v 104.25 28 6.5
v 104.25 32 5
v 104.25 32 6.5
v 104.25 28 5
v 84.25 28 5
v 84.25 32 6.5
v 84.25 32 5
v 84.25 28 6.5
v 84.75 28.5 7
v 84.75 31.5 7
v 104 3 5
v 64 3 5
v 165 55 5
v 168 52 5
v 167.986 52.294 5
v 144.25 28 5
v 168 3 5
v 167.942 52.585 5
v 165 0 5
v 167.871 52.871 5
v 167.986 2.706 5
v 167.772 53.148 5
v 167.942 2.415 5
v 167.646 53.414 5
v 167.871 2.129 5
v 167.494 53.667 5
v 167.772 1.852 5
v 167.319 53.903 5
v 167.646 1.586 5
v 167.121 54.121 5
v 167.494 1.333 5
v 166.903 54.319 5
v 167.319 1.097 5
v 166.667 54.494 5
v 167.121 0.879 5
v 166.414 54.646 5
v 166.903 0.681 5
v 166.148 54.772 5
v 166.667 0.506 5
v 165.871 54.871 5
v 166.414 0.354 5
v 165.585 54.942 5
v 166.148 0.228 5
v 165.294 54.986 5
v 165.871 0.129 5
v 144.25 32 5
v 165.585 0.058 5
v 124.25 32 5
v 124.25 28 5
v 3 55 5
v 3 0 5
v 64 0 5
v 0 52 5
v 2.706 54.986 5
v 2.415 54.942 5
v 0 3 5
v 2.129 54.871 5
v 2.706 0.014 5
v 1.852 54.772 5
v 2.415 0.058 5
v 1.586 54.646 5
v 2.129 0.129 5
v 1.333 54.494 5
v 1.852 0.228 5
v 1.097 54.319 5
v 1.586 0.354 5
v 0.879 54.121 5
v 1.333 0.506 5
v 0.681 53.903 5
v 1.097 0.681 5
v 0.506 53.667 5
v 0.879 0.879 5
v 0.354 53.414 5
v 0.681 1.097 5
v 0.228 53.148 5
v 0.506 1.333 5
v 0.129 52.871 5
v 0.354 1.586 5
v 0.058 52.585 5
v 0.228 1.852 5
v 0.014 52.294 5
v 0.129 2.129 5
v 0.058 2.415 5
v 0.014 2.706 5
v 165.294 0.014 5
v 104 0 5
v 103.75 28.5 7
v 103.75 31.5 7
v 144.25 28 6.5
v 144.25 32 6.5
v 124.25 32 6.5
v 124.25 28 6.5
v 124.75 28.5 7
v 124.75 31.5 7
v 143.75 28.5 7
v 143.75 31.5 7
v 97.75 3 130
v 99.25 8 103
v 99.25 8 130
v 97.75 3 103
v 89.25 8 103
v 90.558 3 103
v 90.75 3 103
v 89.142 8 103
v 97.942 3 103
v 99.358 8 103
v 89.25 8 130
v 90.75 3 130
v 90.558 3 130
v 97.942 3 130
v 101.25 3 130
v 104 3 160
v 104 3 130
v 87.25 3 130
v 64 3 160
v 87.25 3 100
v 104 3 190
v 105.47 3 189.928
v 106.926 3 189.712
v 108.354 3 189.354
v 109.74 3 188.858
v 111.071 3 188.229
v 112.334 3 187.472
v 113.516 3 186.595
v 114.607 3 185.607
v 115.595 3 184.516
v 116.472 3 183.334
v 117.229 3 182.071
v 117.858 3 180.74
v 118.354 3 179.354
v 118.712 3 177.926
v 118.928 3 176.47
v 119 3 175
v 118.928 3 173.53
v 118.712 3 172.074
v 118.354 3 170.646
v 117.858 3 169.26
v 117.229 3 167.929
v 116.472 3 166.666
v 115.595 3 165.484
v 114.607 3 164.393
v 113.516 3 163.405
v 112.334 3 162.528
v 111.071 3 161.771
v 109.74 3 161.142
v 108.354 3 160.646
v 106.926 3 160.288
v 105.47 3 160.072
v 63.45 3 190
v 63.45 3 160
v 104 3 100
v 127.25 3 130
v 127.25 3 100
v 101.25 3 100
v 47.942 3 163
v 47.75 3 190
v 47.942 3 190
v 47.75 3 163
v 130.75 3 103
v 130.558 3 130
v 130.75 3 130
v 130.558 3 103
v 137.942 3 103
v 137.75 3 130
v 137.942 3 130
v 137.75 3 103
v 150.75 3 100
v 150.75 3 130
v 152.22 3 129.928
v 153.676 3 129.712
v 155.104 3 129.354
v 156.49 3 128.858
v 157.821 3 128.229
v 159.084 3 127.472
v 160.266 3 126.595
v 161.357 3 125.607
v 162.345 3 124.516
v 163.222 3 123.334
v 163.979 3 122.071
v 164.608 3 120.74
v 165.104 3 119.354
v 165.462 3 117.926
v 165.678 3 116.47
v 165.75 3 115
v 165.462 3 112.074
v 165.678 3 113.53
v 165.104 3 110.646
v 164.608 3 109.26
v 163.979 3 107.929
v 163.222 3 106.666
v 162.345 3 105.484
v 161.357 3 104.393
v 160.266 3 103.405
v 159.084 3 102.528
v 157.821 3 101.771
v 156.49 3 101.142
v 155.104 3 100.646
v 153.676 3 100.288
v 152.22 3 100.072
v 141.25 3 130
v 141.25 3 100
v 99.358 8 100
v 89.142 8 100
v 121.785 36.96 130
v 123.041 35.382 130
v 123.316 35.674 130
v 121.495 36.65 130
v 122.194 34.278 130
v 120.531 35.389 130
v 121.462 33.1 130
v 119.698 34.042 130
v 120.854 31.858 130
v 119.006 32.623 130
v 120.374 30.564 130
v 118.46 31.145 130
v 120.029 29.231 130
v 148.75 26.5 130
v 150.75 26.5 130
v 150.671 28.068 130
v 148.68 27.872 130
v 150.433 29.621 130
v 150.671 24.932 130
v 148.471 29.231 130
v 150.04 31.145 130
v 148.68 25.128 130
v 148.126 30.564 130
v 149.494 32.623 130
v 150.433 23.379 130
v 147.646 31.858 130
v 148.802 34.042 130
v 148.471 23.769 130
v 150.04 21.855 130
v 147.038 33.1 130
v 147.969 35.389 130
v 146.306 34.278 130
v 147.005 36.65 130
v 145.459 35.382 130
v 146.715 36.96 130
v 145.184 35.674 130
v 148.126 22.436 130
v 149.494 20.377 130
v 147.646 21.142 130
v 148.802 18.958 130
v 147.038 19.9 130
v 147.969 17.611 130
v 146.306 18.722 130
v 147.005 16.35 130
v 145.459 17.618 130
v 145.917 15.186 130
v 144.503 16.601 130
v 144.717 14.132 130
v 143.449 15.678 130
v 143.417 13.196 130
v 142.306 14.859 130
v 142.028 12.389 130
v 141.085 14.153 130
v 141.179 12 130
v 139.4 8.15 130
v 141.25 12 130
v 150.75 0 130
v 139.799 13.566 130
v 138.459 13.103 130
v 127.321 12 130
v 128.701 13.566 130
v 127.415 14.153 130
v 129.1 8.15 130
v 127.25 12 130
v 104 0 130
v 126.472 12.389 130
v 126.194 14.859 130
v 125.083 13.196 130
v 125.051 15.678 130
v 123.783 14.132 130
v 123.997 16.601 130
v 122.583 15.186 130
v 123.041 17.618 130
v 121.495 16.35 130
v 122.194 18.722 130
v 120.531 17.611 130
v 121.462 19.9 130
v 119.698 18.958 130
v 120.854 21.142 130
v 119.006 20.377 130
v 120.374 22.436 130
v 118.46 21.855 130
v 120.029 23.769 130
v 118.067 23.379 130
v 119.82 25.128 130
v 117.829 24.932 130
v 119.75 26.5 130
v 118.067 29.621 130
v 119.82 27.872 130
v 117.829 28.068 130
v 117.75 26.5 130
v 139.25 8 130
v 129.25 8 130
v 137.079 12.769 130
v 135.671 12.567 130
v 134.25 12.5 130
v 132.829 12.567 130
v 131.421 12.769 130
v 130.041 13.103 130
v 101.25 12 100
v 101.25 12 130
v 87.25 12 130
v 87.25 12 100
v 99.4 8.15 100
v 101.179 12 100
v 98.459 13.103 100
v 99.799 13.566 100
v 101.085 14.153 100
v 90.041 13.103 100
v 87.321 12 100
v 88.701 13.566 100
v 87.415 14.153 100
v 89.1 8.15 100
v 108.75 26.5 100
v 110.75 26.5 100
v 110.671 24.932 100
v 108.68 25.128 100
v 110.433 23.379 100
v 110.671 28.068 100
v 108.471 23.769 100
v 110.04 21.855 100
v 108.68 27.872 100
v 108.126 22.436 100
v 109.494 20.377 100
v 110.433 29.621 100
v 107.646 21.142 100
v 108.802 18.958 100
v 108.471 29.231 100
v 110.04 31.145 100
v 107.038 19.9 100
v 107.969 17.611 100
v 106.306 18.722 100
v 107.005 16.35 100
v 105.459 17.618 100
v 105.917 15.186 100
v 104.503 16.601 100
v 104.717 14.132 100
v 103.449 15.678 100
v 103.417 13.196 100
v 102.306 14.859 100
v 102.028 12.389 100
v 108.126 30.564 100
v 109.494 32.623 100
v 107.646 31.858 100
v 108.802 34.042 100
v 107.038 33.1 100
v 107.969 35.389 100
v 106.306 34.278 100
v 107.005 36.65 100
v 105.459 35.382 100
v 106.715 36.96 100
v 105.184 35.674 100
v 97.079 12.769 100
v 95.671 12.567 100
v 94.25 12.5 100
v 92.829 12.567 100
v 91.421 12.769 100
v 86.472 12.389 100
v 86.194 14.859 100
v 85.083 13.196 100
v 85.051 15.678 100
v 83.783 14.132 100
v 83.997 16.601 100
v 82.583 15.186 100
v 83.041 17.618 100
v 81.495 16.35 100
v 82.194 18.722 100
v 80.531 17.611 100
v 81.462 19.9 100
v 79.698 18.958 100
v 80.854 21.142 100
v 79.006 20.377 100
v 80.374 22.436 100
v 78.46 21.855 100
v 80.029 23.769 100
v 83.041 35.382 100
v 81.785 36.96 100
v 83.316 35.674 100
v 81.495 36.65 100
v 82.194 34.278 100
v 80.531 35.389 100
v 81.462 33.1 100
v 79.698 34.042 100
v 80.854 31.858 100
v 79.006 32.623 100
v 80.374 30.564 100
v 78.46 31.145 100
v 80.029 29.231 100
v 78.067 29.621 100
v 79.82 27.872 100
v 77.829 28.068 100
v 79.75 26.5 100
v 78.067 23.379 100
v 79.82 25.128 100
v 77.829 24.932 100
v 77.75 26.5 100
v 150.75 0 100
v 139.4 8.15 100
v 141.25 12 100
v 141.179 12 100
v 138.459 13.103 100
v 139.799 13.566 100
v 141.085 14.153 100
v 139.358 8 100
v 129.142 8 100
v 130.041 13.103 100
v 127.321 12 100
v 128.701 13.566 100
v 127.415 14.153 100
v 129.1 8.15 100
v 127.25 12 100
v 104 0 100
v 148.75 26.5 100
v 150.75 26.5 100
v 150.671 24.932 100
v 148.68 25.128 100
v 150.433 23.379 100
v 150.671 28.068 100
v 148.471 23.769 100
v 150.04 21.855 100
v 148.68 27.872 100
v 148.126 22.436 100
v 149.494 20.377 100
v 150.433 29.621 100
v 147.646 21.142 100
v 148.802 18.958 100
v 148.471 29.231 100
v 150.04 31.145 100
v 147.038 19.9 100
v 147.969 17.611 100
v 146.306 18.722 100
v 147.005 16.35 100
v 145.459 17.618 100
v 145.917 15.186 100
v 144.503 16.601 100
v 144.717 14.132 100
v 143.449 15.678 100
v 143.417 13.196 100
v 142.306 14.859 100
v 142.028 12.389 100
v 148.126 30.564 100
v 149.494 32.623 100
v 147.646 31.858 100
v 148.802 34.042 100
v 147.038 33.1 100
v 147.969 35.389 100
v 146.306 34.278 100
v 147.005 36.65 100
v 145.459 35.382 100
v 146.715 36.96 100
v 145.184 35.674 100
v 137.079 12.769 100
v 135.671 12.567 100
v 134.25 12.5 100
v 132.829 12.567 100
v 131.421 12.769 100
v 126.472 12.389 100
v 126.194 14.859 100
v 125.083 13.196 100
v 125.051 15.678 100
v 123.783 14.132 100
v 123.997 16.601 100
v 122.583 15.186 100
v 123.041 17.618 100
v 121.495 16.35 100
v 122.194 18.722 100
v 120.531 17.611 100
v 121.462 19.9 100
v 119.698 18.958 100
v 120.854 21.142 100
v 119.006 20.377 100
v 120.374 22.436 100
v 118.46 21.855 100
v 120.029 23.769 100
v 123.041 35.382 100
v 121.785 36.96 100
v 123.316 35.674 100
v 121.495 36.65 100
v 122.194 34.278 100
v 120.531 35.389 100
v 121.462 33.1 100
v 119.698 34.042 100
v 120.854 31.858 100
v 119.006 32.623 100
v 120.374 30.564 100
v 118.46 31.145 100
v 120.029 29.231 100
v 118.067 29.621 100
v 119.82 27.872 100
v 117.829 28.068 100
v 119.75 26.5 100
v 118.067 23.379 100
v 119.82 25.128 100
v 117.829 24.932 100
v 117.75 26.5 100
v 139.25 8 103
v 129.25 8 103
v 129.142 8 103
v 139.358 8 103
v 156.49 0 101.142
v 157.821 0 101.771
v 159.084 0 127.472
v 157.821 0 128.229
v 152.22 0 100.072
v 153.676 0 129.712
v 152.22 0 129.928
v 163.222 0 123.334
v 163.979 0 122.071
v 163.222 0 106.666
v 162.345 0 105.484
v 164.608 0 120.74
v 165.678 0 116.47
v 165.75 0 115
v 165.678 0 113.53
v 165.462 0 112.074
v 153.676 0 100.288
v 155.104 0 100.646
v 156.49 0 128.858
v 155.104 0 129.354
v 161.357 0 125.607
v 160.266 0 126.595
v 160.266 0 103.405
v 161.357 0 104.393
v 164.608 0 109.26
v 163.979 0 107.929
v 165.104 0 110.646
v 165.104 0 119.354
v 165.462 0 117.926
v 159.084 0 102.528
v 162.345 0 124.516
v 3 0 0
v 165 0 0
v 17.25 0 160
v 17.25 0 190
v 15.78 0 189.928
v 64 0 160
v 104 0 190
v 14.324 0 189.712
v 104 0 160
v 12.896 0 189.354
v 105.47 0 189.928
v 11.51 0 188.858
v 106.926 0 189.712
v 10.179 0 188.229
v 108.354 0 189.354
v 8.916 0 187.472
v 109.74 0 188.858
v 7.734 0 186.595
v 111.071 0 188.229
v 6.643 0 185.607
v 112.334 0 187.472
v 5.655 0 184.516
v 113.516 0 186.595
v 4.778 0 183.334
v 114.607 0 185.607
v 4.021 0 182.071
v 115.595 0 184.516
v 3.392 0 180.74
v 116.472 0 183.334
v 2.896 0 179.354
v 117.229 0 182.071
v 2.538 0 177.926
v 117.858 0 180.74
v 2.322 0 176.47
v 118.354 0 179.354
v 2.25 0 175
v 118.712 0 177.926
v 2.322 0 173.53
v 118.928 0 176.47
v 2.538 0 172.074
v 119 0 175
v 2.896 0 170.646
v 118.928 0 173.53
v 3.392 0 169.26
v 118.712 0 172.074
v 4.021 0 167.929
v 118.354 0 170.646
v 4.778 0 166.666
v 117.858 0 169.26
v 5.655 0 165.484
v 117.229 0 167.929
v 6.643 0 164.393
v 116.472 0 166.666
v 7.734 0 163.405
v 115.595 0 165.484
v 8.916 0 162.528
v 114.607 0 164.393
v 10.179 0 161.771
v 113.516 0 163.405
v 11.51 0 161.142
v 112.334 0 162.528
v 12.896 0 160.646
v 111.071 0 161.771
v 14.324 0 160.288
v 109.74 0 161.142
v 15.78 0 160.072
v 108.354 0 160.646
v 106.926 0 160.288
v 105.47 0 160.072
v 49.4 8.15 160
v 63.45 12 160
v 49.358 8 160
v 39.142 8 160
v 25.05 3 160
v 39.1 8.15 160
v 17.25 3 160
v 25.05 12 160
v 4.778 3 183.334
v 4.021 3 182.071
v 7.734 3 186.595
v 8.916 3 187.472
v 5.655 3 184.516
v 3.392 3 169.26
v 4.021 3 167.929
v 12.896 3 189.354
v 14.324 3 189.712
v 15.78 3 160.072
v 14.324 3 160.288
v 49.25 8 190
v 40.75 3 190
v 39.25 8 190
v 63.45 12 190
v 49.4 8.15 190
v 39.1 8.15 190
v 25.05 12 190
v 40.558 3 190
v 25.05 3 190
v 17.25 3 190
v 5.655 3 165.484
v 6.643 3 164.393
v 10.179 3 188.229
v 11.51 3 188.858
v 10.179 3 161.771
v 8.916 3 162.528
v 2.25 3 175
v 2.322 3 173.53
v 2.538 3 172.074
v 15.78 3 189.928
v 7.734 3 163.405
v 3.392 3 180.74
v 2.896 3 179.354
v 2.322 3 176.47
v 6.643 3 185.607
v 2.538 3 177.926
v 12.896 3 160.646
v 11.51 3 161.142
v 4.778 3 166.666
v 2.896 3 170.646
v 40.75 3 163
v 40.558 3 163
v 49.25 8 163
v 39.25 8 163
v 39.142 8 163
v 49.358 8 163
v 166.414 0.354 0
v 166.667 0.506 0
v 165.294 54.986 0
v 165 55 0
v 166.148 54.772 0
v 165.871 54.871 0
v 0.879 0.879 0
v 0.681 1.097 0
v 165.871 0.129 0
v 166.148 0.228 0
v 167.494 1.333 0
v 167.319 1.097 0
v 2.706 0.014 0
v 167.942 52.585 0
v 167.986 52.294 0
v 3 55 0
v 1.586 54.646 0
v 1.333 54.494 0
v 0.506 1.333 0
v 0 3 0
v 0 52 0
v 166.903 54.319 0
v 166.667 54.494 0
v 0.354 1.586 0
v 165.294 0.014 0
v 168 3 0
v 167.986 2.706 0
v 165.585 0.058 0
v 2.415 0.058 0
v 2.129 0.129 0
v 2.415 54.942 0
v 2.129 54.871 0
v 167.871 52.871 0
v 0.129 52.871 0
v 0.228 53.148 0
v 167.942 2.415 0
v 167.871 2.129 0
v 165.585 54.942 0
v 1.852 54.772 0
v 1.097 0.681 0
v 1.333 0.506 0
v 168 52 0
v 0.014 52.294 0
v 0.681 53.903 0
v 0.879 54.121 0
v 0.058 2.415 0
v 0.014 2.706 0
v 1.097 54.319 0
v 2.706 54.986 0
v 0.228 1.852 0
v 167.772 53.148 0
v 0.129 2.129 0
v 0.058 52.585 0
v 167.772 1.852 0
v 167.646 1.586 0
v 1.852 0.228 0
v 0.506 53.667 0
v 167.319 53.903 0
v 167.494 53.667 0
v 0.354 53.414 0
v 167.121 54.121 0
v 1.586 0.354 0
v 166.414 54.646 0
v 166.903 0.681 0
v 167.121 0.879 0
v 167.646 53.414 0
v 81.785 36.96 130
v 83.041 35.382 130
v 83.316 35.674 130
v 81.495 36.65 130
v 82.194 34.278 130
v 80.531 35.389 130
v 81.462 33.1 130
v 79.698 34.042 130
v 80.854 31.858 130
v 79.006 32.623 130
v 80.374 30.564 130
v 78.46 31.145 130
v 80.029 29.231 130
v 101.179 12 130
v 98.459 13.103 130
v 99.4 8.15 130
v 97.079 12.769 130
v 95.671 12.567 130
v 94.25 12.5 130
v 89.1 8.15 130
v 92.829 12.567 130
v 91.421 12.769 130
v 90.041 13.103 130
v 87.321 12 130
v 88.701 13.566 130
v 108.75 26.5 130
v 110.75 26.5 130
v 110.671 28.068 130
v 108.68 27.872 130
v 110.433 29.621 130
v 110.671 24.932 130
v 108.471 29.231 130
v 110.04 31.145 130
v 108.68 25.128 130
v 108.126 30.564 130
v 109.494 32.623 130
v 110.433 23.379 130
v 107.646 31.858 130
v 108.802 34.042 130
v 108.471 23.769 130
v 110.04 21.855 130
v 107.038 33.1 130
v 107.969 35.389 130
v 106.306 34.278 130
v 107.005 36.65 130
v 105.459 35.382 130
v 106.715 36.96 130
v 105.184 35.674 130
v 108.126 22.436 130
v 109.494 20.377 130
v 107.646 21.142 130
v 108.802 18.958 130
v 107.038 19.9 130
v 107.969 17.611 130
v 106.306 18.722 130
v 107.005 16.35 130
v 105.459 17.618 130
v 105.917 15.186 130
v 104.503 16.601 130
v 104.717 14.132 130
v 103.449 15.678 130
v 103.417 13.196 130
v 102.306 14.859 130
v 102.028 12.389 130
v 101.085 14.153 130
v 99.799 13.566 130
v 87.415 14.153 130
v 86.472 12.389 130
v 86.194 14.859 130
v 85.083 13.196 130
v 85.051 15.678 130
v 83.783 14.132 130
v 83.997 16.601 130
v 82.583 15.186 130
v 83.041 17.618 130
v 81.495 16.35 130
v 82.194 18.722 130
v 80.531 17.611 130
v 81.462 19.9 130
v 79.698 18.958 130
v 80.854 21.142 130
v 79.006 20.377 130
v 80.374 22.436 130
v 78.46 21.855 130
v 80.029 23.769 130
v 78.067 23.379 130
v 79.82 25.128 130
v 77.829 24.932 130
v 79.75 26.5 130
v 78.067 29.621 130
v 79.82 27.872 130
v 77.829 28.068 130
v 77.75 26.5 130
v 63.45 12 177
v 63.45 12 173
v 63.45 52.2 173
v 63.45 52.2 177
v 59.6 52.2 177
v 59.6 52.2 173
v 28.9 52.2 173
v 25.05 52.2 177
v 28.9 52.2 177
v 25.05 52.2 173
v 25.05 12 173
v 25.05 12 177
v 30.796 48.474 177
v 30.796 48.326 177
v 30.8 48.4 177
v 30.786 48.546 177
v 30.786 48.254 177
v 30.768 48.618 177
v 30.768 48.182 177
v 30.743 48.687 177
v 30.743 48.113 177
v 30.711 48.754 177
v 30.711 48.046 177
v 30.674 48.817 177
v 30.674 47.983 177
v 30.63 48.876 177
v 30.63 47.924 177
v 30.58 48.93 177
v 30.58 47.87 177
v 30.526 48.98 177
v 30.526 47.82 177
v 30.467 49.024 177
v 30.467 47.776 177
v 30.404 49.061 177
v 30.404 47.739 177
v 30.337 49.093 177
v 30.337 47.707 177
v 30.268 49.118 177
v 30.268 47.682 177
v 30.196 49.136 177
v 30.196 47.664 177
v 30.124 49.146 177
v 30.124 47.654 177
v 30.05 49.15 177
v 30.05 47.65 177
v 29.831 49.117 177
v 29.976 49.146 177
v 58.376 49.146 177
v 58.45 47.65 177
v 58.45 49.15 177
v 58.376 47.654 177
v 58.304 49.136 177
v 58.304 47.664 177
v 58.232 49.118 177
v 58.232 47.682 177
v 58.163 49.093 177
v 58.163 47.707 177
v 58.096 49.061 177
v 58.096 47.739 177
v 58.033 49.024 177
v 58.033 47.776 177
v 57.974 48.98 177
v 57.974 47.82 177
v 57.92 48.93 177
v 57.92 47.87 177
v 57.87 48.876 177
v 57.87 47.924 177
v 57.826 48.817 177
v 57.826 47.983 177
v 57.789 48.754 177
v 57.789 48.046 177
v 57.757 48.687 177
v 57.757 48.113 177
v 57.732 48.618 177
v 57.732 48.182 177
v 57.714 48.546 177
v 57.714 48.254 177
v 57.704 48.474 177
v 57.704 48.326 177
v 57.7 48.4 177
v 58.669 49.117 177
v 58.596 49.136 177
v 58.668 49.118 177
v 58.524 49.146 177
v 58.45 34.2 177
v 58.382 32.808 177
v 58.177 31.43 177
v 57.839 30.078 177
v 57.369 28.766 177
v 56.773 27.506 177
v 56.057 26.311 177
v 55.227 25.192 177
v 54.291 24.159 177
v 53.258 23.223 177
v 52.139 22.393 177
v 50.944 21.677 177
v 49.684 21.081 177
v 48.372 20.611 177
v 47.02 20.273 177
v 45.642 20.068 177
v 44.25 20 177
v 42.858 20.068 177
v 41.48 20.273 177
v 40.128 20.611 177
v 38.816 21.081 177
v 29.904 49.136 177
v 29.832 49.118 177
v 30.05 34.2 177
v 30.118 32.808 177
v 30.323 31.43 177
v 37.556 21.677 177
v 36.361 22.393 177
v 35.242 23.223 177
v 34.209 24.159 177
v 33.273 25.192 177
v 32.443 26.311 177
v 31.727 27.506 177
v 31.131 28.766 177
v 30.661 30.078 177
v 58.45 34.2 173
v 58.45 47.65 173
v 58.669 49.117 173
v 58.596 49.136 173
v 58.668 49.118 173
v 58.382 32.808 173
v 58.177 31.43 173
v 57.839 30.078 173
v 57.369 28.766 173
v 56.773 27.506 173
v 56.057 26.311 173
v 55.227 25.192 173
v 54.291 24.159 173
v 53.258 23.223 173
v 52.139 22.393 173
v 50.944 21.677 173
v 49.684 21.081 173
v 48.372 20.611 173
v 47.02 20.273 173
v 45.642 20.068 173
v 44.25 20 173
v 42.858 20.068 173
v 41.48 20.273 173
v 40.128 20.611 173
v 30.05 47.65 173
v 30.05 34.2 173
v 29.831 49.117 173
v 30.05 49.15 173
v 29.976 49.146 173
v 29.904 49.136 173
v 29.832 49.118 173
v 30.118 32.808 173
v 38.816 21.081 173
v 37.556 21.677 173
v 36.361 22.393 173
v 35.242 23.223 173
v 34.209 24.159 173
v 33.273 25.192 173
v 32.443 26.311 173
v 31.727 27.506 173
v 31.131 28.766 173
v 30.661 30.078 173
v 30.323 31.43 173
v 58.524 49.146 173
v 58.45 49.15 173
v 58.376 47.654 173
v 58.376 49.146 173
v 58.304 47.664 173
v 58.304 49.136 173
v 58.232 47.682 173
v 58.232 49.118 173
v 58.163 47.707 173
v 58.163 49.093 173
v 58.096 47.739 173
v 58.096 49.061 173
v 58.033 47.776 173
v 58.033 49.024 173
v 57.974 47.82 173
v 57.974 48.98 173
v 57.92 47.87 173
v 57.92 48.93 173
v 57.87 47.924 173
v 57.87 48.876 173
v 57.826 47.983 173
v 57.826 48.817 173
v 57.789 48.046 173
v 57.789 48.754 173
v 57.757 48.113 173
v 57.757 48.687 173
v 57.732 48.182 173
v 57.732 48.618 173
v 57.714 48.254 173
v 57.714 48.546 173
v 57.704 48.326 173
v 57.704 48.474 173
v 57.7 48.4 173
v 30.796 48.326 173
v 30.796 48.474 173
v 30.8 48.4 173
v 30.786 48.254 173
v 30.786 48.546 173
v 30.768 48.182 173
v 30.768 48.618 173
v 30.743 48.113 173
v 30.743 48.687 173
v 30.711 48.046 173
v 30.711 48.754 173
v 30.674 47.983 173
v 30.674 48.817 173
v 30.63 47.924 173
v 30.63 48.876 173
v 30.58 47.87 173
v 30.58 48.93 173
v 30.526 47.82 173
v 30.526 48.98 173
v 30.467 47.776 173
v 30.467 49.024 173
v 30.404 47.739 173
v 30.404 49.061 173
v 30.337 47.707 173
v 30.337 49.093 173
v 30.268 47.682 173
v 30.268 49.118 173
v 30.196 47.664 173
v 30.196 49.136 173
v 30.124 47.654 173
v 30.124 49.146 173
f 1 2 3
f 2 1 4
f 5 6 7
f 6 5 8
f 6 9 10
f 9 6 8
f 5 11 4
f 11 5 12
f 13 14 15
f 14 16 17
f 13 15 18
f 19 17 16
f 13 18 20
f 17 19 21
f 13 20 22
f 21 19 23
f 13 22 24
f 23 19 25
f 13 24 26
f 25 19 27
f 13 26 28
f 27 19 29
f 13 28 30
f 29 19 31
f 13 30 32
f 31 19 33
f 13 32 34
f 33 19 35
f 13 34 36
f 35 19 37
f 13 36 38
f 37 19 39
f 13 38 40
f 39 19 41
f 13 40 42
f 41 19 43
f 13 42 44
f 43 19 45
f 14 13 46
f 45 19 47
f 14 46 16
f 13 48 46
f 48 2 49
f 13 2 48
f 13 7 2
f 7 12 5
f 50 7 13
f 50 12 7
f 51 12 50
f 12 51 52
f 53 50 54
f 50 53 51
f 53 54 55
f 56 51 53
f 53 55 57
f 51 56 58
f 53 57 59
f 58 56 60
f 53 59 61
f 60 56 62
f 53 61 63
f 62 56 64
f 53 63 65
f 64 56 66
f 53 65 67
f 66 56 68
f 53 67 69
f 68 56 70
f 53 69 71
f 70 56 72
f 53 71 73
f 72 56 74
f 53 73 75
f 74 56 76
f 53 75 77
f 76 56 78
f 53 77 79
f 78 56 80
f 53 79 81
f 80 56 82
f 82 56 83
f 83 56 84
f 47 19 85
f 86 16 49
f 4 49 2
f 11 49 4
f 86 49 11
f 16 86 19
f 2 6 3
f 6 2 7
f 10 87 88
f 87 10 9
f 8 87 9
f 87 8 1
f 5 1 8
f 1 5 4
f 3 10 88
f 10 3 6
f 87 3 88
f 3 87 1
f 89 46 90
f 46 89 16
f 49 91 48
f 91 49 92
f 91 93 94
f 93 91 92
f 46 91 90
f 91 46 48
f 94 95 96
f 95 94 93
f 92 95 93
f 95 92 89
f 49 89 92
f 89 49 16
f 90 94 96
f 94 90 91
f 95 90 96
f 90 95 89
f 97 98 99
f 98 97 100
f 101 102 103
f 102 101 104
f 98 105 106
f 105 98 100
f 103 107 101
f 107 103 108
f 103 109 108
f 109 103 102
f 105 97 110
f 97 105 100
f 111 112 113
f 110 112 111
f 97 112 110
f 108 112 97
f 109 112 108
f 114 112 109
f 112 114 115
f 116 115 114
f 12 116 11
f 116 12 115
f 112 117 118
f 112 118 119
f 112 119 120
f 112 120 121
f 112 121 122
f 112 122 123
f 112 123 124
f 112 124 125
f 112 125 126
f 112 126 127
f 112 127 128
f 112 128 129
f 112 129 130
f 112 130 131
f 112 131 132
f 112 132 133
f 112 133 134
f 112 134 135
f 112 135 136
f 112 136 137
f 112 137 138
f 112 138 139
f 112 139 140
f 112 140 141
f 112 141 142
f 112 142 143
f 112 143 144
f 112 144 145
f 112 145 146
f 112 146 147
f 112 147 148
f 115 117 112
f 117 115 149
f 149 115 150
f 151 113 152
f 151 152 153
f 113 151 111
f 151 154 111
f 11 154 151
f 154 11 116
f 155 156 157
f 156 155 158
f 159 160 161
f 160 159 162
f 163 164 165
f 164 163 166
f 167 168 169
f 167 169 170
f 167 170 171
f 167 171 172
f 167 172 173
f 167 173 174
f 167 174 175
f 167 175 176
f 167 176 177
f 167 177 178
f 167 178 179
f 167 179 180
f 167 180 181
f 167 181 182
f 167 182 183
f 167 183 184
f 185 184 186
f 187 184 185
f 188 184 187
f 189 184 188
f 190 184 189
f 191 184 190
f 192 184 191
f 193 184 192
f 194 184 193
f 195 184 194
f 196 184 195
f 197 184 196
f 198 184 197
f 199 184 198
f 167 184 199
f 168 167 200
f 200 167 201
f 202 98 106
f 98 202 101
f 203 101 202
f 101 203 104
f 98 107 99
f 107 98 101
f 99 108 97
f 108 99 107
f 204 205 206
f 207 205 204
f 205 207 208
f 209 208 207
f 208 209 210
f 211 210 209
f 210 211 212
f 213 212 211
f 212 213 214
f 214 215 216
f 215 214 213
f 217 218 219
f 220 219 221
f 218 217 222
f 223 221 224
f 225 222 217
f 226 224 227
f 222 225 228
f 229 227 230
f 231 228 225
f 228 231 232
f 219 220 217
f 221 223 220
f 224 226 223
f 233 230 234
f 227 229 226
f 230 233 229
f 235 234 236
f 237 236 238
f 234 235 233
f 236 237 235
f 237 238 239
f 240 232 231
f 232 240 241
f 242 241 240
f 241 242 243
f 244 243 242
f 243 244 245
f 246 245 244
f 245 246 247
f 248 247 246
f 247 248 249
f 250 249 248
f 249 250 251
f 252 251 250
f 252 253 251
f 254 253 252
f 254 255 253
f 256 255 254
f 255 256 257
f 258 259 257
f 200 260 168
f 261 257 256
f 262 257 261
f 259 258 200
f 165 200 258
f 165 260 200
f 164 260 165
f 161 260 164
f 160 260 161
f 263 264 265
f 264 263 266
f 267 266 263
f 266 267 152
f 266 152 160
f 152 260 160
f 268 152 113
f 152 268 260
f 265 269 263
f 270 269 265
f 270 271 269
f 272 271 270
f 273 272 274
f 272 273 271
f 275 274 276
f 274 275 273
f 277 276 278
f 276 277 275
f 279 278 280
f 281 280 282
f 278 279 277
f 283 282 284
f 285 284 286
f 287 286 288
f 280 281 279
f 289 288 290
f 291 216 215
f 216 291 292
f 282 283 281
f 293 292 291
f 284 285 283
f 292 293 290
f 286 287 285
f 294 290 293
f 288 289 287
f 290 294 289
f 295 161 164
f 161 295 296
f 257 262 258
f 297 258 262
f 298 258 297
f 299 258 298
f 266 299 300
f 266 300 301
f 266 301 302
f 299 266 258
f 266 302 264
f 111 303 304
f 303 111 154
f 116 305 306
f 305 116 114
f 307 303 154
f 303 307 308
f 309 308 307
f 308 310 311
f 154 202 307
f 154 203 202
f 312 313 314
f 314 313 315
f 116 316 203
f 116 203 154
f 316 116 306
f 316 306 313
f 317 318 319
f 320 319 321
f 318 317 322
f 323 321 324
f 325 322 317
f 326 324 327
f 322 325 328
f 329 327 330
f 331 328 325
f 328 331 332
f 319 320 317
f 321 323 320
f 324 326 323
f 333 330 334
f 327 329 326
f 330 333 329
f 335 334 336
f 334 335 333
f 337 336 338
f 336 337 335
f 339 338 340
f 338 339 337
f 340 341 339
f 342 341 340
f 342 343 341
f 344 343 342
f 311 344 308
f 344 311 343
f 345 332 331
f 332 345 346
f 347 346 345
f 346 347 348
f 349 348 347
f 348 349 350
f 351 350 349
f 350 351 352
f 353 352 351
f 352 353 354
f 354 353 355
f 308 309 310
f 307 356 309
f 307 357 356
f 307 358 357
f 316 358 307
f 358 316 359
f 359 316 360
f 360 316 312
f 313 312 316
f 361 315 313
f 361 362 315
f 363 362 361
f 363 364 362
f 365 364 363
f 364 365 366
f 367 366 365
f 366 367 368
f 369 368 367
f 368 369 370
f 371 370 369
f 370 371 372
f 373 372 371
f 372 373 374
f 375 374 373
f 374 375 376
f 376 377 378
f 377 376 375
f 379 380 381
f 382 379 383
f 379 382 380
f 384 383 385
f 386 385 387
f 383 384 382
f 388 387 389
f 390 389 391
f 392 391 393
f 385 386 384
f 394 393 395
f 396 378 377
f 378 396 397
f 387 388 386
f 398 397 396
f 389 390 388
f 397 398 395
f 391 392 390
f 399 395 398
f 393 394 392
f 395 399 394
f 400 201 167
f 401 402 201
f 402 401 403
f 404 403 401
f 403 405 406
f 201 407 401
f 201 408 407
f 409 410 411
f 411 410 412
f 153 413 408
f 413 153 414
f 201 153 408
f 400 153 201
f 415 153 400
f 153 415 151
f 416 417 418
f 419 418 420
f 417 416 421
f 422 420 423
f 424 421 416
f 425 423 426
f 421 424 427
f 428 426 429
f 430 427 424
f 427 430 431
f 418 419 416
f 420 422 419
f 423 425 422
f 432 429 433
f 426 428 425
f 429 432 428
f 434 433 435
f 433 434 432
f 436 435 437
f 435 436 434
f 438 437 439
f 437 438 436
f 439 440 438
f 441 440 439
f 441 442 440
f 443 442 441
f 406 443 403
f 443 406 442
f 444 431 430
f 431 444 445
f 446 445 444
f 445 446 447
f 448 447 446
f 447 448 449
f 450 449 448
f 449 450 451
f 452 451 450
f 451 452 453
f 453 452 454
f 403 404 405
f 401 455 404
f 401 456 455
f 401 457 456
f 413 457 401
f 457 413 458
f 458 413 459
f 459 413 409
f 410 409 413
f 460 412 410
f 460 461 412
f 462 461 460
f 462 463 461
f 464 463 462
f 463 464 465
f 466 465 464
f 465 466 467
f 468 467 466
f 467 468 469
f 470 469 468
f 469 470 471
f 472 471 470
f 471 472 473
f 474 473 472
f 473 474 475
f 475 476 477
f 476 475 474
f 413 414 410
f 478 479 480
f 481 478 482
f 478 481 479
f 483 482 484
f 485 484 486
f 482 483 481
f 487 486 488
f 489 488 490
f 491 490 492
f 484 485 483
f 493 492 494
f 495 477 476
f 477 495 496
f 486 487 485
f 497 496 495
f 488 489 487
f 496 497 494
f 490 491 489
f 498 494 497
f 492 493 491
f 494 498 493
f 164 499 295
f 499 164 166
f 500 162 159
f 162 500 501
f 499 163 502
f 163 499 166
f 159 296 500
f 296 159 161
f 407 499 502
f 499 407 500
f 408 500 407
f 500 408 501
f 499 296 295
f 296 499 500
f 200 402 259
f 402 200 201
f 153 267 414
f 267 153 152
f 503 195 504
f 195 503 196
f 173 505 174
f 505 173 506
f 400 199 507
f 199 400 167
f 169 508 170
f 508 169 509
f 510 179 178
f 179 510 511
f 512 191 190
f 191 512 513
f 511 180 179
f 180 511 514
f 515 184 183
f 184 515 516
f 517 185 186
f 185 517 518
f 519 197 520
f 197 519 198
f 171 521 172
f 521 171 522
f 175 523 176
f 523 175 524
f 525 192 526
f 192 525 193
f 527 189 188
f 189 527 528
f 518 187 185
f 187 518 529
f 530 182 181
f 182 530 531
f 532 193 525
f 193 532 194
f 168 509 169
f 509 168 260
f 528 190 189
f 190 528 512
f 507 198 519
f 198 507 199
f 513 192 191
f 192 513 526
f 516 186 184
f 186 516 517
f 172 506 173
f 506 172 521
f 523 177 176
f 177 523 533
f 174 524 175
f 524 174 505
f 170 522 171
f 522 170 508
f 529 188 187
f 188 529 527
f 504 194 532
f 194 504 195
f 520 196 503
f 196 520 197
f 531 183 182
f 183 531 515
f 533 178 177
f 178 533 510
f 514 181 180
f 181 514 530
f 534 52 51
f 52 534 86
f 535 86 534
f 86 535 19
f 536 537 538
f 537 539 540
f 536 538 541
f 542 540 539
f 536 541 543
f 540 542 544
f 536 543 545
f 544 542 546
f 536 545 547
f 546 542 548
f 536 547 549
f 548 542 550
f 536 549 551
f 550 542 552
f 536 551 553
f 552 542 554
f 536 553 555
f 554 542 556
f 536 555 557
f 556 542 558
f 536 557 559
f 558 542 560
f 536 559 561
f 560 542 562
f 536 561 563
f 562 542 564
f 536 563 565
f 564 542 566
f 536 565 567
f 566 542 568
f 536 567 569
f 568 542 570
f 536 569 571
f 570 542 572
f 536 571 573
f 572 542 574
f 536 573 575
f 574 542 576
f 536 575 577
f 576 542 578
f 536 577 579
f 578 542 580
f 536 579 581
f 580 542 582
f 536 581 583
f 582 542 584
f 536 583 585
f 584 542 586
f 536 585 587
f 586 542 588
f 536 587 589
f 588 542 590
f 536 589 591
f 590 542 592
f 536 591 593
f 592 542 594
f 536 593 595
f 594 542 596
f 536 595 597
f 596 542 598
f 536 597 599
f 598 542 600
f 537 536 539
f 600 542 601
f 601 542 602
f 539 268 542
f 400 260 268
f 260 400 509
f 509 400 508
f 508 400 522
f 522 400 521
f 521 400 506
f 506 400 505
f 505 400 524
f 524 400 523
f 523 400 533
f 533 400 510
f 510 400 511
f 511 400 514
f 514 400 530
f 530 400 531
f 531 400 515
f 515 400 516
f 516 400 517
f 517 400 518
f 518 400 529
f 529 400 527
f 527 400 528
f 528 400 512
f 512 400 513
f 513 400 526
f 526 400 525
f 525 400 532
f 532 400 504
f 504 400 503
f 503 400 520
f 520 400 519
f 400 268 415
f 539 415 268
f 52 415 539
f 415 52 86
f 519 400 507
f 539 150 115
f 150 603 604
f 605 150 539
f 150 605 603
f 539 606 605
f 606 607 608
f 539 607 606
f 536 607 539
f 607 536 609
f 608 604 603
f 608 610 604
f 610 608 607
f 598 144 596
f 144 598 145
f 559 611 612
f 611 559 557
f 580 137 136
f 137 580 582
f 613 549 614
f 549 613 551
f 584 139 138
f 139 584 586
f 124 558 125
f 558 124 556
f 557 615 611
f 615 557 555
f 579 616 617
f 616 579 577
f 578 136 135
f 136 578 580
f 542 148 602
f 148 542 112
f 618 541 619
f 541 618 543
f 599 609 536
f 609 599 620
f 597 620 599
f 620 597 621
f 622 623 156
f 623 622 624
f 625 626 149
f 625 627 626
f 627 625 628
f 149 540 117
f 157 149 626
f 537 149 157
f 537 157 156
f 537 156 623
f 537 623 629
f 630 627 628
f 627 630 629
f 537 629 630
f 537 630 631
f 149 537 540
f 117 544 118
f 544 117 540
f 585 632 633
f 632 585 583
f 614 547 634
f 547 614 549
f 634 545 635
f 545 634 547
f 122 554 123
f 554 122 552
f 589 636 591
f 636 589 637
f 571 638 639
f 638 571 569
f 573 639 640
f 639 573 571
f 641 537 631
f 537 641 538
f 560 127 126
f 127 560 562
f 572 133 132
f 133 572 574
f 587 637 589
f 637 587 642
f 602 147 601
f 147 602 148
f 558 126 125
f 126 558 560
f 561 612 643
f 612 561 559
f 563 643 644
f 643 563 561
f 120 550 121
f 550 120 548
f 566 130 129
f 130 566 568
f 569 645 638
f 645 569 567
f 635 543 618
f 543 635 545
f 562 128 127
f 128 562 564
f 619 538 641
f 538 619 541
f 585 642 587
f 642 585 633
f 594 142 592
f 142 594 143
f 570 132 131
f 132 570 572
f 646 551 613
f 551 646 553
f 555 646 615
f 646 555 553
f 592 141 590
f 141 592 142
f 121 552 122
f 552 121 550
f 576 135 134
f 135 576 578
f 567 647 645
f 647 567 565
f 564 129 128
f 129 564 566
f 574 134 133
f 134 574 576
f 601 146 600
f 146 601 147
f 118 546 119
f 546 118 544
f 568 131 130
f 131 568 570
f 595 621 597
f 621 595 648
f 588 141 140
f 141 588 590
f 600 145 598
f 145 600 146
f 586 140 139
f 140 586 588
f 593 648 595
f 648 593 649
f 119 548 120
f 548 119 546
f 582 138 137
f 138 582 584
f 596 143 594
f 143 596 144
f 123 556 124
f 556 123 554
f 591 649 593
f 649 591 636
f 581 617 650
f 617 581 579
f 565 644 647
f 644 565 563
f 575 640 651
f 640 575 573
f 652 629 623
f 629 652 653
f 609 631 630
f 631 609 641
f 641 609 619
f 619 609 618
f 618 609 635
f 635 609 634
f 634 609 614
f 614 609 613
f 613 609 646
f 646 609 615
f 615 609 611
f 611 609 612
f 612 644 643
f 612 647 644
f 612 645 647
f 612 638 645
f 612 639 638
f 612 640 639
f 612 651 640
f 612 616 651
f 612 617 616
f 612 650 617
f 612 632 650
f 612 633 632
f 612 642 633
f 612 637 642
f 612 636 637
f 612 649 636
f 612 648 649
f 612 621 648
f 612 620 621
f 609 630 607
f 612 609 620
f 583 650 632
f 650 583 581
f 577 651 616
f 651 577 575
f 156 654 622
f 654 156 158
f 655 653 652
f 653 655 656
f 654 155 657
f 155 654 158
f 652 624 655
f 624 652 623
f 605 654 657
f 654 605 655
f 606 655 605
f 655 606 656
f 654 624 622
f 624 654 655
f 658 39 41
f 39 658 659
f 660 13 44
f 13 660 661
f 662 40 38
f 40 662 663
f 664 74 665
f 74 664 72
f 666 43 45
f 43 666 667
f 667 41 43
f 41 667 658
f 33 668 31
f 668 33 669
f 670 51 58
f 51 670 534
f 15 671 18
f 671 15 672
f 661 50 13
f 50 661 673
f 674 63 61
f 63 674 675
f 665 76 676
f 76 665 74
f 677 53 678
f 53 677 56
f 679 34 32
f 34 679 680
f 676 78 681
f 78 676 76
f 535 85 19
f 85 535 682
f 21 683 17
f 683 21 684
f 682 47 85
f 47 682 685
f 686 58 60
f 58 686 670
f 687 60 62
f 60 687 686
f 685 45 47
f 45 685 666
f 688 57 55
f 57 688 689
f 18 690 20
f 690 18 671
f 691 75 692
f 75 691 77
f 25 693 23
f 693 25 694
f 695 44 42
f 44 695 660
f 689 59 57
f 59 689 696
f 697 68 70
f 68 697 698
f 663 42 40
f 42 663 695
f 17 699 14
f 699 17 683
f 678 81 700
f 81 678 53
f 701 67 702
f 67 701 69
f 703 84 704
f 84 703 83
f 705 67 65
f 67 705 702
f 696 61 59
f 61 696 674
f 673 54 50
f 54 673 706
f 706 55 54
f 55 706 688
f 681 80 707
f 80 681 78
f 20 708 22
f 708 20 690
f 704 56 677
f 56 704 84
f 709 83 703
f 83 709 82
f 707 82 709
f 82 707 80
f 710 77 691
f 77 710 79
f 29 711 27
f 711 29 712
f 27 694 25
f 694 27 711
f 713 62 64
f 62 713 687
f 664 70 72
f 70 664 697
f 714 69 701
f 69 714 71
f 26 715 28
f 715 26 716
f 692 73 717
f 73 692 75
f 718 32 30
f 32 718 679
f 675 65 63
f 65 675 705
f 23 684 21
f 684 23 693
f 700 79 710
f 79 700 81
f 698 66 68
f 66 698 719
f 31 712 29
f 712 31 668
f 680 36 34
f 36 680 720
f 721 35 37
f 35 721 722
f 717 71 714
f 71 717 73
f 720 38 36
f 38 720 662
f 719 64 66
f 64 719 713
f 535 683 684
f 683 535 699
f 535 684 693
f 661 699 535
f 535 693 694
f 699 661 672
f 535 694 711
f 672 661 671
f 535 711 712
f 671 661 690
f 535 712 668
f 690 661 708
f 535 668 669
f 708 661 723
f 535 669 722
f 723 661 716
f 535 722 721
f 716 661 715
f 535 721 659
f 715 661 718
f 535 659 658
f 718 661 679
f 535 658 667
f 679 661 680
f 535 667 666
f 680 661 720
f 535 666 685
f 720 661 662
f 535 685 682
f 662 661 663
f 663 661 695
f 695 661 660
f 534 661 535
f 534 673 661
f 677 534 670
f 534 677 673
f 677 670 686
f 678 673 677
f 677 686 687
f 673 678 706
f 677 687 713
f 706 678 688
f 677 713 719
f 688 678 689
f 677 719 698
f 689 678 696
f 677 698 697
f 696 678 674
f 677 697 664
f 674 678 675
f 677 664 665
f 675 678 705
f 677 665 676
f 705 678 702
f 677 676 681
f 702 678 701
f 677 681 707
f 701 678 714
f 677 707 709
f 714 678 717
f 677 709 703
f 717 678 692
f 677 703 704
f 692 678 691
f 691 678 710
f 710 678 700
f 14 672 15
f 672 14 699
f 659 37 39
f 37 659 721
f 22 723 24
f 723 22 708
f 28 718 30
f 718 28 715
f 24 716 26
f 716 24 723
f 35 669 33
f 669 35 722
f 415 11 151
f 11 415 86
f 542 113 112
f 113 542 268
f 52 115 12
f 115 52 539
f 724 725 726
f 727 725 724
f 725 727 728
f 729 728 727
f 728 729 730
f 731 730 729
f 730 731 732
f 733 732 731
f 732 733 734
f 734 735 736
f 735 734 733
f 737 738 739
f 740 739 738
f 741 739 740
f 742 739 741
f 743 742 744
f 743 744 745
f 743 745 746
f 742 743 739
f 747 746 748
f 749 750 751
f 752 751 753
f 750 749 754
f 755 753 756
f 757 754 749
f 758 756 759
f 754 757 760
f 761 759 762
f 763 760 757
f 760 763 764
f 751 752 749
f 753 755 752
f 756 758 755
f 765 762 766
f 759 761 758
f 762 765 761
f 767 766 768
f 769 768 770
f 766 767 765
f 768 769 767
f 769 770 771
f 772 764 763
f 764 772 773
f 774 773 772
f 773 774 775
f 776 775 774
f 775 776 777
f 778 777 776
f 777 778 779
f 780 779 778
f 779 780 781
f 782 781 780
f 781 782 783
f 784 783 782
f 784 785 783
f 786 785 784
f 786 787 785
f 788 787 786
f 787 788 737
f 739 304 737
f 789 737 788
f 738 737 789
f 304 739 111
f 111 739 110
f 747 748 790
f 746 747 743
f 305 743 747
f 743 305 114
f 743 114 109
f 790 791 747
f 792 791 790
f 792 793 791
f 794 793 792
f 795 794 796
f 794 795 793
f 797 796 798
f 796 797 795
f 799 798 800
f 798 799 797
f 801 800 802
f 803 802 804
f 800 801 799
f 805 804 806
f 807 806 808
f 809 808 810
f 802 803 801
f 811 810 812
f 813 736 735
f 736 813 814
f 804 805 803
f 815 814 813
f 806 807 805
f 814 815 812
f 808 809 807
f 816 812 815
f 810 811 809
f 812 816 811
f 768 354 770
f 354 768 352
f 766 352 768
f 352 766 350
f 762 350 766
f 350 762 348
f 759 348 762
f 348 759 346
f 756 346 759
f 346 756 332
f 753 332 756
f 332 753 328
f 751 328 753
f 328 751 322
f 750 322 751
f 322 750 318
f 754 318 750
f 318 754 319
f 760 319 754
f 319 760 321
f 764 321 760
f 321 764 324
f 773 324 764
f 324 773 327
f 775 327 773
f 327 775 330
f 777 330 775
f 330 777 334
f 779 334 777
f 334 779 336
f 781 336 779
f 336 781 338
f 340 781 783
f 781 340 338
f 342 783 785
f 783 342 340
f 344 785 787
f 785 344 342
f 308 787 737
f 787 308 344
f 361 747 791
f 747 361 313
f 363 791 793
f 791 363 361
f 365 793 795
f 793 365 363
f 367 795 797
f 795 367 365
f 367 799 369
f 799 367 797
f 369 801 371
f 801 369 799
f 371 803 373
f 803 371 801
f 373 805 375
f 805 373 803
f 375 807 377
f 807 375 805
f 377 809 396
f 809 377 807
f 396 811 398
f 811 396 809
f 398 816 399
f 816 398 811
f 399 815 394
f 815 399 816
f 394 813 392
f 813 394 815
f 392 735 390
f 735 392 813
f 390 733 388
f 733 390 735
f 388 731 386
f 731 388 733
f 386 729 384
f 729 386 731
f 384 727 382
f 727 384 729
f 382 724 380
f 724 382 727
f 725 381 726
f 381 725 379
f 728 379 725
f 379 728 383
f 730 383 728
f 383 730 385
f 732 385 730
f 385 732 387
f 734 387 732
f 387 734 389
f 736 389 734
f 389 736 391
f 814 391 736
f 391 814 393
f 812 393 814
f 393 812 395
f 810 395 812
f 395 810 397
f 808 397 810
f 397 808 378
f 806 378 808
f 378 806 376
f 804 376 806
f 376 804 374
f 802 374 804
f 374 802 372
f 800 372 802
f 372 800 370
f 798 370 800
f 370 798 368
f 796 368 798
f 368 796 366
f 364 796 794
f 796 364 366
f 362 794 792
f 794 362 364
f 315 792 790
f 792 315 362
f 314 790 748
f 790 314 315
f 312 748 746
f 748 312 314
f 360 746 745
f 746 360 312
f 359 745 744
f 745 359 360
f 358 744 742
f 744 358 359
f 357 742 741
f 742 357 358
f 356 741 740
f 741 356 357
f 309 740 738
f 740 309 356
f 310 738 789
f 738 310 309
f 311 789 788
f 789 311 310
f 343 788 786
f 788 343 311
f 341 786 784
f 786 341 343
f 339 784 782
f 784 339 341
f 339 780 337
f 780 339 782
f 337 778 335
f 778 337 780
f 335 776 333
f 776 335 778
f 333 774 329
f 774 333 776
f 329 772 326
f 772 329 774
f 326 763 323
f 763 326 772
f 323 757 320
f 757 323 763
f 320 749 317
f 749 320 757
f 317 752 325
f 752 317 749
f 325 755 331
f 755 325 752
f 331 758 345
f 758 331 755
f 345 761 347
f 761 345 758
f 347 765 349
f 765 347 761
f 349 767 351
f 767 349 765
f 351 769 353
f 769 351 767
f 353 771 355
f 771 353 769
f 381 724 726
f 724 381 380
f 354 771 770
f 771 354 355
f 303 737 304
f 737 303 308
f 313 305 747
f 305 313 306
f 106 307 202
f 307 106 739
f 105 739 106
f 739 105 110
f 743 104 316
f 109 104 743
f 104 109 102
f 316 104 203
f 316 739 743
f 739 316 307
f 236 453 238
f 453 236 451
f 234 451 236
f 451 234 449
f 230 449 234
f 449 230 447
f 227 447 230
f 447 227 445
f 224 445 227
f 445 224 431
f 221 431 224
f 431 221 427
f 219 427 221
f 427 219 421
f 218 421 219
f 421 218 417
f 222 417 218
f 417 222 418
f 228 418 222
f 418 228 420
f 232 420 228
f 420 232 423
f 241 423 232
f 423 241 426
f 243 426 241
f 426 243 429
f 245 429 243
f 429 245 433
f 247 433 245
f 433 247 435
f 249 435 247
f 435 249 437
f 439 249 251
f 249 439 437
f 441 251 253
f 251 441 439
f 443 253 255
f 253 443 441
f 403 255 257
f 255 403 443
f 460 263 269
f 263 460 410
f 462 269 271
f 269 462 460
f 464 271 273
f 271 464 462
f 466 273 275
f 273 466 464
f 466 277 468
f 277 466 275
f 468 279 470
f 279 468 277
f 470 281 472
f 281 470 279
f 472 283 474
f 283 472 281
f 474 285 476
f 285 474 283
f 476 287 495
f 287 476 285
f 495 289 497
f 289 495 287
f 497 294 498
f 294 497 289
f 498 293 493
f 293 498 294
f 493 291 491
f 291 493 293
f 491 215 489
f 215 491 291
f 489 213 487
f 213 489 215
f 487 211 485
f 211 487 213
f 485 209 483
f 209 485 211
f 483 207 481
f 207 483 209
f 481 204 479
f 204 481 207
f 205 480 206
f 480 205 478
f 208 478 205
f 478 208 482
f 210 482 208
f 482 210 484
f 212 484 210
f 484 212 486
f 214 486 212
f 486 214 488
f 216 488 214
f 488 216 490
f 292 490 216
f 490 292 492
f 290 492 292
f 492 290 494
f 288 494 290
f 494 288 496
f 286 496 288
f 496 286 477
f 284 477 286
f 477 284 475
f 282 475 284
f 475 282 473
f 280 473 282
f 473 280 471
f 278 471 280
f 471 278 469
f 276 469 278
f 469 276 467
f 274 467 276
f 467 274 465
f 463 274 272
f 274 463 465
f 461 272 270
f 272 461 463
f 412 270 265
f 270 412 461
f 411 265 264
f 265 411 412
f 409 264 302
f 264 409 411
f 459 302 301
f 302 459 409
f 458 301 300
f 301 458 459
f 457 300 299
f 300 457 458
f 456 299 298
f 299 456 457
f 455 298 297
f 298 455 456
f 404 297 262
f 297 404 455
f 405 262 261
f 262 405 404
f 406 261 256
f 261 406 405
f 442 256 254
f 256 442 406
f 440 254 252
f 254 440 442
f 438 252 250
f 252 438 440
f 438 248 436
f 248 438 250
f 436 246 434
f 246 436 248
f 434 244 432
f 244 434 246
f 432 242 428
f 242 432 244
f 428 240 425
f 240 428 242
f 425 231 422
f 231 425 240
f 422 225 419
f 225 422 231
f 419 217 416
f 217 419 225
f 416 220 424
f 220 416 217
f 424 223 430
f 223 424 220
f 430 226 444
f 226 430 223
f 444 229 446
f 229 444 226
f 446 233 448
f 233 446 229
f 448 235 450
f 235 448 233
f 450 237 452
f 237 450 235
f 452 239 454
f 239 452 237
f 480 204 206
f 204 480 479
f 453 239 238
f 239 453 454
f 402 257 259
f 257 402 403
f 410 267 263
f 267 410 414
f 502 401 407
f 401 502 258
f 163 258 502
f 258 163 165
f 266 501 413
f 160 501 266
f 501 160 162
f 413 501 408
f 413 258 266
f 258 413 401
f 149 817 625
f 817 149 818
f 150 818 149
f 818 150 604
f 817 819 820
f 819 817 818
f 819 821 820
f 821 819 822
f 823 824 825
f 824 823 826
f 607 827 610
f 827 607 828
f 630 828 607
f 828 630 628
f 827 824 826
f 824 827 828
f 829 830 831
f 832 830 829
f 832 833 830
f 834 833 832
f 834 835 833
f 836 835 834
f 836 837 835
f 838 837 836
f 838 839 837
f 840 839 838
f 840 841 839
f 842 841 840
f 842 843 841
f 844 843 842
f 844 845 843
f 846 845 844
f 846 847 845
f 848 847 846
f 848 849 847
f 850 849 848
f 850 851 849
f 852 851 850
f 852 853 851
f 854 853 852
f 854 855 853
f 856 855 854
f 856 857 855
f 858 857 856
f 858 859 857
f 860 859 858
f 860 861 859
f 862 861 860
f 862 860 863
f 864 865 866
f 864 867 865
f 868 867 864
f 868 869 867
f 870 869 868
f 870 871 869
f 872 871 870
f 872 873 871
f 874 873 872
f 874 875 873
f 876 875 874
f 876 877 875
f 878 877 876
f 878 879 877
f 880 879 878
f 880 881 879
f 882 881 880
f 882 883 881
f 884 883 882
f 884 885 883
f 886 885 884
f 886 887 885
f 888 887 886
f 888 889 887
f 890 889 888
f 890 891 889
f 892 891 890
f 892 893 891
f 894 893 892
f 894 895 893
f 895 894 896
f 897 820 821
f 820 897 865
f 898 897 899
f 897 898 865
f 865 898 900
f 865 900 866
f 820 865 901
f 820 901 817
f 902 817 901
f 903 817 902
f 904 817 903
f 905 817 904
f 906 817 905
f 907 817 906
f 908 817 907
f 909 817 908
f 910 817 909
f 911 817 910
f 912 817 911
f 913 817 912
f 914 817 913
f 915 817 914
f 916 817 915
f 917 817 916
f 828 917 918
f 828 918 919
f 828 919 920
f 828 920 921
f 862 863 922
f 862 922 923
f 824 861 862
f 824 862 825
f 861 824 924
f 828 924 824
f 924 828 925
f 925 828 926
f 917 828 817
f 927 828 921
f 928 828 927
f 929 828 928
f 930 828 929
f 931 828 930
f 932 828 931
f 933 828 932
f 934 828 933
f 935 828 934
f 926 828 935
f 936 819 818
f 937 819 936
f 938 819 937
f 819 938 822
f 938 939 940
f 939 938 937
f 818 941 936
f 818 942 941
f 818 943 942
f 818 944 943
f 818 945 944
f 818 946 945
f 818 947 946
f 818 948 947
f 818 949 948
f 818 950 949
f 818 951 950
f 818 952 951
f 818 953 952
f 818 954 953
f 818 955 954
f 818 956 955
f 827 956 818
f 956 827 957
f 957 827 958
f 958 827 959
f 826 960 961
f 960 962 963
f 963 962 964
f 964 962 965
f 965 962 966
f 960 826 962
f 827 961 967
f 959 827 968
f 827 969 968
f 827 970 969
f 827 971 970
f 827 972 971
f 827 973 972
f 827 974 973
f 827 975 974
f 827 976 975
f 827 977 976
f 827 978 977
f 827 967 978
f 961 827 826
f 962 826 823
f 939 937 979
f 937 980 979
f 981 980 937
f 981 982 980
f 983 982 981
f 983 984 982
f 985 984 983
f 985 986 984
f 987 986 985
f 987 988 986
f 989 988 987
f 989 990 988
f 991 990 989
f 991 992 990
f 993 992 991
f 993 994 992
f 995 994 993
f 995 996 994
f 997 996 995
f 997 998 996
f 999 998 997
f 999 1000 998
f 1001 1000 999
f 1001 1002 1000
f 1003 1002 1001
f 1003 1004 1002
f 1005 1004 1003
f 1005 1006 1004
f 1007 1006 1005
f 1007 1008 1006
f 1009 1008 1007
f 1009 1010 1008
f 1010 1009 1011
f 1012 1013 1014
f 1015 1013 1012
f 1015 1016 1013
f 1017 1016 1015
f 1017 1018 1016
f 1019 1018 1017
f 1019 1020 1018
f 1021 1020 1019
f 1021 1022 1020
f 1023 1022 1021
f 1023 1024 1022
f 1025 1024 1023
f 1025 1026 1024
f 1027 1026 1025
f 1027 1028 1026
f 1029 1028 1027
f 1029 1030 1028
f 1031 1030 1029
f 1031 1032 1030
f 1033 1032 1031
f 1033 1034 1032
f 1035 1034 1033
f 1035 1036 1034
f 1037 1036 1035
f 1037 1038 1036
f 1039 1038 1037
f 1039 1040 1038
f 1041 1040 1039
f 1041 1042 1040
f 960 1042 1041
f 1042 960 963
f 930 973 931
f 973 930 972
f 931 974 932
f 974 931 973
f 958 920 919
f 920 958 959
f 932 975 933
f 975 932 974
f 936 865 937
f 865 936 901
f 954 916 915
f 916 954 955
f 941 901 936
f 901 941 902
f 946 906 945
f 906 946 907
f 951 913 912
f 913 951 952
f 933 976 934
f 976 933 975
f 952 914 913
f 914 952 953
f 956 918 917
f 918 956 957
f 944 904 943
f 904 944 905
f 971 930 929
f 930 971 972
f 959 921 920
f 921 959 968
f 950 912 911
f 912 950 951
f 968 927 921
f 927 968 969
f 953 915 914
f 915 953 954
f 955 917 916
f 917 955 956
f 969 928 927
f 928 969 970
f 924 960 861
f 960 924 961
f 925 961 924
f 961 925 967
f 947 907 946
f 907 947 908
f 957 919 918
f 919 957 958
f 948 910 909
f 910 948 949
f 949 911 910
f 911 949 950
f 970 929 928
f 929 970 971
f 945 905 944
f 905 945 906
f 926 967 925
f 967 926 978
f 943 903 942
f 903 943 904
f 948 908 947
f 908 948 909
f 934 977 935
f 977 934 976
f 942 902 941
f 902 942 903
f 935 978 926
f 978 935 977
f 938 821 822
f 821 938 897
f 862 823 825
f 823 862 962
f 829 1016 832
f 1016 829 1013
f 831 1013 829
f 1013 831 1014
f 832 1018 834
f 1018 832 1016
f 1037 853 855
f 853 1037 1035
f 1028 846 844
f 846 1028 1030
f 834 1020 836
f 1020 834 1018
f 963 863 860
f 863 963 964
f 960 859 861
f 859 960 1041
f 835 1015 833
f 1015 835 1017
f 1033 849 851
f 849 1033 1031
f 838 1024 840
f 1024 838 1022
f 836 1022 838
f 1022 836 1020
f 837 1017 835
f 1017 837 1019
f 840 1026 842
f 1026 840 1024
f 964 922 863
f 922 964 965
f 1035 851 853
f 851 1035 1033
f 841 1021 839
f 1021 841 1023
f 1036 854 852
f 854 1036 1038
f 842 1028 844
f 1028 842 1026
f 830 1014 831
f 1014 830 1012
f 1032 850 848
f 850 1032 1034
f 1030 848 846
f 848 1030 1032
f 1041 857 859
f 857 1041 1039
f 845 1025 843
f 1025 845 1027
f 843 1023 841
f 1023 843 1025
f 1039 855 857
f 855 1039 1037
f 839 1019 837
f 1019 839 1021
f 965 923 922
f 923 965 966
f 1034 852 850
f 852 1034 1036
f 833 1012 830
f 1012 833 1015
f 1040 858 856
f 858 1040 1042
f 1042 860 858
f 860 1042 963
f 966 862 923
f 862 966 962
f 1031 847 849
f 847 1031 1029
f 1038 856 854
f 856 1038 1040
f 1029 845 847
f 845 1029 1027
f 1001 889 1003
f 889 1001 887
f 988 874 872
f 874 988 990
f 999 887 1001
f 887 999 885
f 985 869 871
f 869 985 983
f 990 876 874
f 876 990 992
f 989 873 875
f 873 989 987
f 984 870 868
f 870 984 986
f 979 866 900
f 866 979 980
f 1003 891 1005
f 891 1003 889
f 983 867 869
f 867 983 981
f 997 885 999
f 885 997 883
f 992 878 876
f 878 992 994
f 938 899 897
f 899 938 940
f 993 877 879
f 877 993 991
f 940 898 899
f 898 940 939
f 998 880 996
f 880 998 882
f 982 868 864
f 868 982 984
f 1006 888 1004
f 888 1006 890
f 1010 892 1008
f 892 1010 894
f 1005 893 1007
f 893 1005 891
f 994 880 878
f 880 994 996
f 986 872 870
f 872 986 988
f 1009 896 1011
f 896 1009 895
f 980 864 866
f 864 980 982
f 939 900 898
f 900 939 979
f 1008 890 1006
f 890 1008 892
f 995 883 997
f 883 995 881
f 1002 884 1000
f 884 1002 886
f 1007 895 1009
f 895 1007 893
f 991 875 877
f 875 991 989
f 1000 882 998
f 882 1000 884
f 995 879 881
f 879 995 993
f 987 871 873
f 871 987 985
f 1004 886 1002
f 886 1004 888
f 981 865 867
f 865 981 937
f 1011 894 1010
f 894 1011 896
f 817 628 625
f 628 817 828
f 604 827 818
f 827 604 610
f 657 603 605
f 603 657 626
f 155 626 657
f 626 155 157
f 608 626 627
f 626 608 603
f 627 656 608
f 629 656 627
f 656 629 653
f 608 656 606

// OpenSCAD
// =====================================
// Electric Toothbrush Holder - Full Assembly
// Renders the complete holder in native Z-up orientation
// =====================================

include <_toothbrush_holder.scad>

// ---- Render ----
toothbrush_holder();
